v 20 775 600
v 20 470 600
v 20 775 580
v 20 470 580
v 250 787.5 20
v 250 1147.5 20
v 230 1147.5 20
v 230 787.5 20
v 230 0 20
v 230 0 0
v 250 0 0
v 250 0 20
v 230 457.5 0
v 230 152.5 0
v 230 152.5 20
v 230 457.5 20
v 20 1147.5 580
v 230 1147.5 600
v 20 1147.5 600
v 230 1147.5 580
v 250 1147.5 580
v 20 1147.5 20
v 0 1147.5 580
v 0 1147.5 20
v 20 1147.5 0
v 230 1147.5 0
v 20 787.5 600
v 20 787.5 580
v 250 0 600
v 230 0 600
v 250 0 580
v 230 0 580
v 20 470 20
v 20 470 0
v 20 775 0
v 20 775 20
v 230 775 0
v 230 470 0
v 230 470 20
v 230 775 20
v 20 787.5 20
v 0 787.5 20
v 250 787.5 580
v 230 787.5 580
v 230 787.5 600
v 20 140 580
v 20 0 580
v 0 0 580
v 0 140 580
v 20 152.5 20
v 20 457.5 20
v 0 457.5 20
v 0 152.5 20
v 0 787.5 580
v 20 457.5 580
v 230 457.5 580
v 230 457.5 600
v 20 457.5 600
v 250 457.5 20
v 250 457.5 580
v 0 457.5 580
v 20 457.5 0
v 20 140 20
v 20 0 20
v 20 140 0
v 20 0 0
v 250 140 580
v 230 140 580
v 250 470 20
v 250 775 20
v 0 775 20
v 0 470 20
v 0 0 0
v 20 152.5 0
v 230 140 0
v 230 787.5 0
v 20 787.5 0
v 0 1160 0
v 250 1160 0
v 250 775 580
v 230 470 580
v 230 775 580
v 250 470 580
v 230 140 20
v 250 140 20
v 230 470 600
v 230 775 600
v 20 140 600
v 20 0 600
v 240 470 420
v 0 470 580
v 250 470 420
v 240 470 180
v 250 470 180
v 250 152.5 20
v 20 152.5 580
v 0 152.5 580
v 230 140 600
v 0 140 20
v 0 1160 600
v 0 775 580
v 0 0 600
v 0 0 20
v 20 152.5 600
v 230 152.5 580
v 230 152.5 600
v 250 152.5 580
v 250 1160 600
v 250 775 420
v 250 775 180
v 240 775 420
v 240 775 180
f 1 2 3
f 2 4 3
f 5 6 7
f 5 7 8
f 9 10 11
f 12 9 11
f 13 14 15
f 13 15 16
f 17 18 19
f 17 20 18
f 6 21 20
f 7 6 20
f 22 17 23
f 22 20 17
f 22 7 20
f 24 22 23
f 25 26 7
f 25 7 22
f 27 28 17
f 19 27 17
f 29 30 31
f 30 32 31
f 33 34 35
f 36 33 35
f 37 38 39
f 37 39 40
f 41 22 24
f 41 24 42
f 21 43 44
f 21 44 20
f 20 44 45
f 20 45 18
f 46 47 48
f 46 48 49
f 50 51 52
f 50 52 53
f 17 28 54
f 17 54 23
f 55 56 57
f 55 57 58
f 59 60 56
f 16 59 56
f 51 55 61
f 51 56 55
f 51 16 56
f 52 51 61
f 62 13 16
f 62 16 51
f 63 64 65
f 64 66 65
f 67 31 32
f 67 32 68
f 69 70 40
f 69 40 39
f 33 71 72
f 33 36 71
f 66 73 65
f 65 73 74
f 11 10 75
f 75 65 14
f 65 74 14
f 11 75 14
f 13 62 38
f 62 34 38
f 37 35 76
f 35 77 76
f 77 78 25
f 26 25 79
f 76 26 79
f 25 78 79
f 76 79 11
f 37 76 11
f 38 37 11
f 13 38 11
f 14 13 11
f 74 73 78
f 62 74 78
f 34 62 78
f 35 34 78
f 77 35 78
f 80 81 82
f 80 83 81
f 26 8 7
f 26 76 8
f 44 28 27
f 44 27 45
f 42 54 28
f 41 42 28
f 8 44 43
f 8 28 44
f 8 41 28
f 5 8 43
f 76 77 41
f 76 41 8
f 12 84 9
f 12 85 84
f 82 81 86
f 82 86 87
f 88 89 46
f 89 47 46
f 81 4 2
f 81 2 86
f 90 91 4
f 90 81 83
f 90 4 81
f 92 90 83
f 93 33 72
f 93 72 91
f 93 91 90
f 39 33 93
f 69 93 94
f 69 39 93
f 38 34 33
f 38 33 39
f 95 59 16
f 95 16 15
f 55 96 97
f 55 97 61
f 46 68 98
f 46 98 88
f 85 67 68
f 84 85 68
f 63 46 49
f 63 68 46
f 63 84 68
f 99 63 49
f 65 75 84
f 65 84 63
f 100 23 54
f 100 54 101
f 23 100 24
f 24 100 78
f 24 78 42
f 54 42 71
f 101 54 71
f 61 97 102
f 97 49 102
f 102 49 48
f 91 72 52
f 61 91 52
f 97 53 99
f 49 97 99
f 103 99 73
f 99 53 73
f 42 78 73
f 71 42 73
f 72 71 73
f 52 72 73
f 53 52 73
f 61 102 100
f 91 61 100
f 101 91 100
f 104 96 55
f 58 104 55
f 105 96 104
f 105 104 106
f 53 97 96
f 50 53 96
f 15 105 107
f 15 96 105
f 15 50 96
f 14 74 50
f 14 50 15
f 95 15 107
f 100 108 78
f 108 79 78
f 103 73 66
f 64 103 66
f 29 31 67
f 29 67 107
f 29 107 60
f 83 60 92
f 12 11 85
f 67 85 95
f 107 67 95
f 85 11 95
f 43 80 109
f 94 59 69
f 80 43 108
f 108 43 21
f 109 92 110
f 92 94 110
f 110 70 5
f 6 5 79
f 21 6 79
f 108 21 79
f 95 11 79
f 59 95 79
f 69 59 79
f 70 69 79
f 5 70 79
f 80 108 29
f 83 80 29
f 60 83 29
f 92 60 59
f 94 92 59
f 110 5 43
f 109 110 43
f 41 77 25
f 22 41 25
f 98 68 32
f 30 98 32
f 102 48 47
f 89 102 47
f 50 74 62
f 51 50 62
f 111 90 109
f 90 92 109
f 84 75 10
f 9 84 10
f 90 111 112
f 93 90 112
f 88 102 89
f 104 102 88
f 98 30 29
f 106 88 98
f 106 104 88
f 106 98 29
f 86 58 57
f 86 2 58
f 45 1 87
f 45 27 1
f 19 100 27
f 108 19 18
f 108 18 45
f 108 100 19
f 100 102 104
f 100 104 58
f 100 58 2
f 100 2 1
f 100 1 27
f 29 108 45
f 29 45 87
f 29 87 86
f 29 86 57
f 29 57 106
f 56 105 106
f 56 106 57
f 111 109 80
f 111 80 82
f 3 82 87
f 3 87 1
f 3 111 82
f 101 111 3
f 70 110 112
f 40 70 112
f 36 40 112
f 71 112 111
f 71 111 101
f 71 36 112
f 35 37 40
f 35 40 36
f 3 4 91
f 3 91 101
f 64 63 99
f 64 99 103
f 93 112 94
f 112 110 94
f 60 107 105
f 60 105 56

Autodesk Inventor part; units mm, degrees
ref_plane "YZ Plane" through (0, 0, 0) normal (1, 0, 0) x (0, 1, 0)
ref_plane "XZ Plane" through (0, 0, 0) normal (0, 1, 0) x (-1, 0, 0)
ref_plane "XY Plane" through (0, 0, 0) normal (0, 0, 1) x (1, 0, 0)
sketch "Boceto1" plane through (0, 0, 0) normal (0, 0, 1) x (1, 0, 0)
  line L0 (250, 0) -> (250, 1160)
  line L1 (0, 1160) -> (0, 0)
  line L2 (230, 20) -> (230, 0)
  line L3 (20, 20) -> (20, 0)
  line L4 (230, 0) -> (230, 140)
  line L5 (230, 140) -> (20, 140)
  line L6 (20, 152.5) -> (230, 152.5)
  line L7 (230, 152.5) -> (230, 457.5)
  line L8 (230, 457.5) -> (20, 457.5)
  line L9 (20, 457.5) -> (20, 470)
  line L10 (20, 470) -> (230, 470)
  line L11 (230, 470) -> (230, 457.5)
  line L12 (230, 470) -> (230, 775)
  line L13 (230, 775) -> (20, 775)
  line L14 (20, 775) -> (20, 787.5)
  line L15 (20, 787.5) -> (230, 787.5)
  line L16 (230, 787.5) -> (230, 775)
  line L17 (230, 787.5) -> (230, 1147.5)
  line L18 (230, 1147.5) -> (20, 1147.5)
  line L19 (20, 1160) -> (230, 1160)
  line L20 (230, 1160) -> (230, 1147.5)
  line L21 (0, 0) -> (20, 0)
  line L22 (230, 0) -> (250, 0)
  line L23 (20, 20) -> (20, 140)
  line L24 (230, 140) -> (230, 20)
  line L25 (20, 152.5) -> (20, 457.5)
  line L26 (230, 1147.5) -> (230, 470)
  line L27 (230, 457.5) -> (230, 152.5)
  line L28 (20, 470) -> (20, 775)
  line L29 (20, 787.5) -> (20, 1147.5)
  line L30 (0, 0) -> (529.2462, 0) construction
  line L31 (20, 1160) -> (0, 1160)
  line L32 (230, 1160) -> (250, 1160)
  line L33 (230, 1147.5) -> (250, 1147.5)
  dimension "d5" = 140
  dimension "d6" = 12.5
  dimension "d7" = 305
  dimension "d8" = 12.5
  dimension "d9" = 305
  dimension "d10" = 12.5
  dimension "d11" = 360
  dimension "d13" = 12.5
  dimension "d28" = 1160
  dimension "d29" = 250
  dimension "d30" = 210
  dimension "d31" = 20
extrude "Extrusión1" add sketch "Boceto1" along normal blind 600 contours L22 L2 L4 L5 L23 L3 L21 L1 L31 L19 L20 L33 L0 | L33 L20 L32 L0 | L16 L13 L14 L15 | L11 L8 L9 L10
sketch "Boceto2" plane through (250, 0, 0) normal (1, 0, 0) x (0, 0, -1)
  line L0 (0, 457.5) -> (0, 152.5) projected
  line L1 (0, 152.5) -> (0, 457.5) projected
  line L2 (0, 0) -> (-600, 0) projected
  line L3 (0, 0) -> (-600, 0) projected
  line L4 (0, 0) -> (-600, 0) projected
  line L5 (0, 0) -> (-600, 0) projected
  line L6 (-600, 140) -> (-600, 0) projected
  line L7 (0, 140) -> (0, 0) projected
  line L8 (0, 0) -> (-600, 0) projected
  line L9 (-600, 140) -> (-600, 0) projected
  line L10 (0, 140) -> (-600, 140) projected
  line L11 (0, 0) -> (-600, 0) projected
  line L12 (0, 0) -> (-600, 0) projected
  line L13 (0, 140) -> (-600, 140) projected
  line L14 (0, 0) -> (0, 140) projected
  line L15 (0, 140) -> (-600, 140) projected
  line L16 (-600, 0) -> (-600, 140) projected
  line L17 (0, 0) -> (-600, 0) projected
  line L18 (0, 140) -> (-600, 140) projected
  line L19 (0, 140) -> (-600, 140) projected
  line L20 (0, 152.5) -> (-600, 152.5) projected
  line L21 (-600, 457.5) -> (-600, 152.5) projected
  line L22 (0, 457.5) -> (0, 152.5) projected
  line L23 (0, 152.5) -> (-600, 152.5) projected
  line L24 (-600, 457.5) -> (-600, 152.5) projected
  line L25 (0, 457.5) -> (-600, 457.5) projected
  line L26 (-600, 152.5) -> (-600, 457.5) projected
  line L27 (0, 152.5) -> (0, 457.5) projected
  line L28 (0, 457.5) -> (-600, 457.5) projected
  line L29 (-600, 152.5) -> (-600, 457.5) projected
  line L30 (0, 152.5) -> (-600, 152.5) projected
  line L31 (0, 0) -> (0, 1160) projected
  line L32 (0, 1160) -> (0, 0) projected
  line L33 (0, 140) -> (0, 0) projected
  line L34 (0, 0) -> (0, 140) projected
  line L35 (0, 1160) -> (0, 0) projected
  line L36 (0, 0) -> (0, 1160) projected
  line L37 (0, 470) -> (0, 775) projected
  line L38 (0, 775) -> (0, 470) projected
  line L39 (0, 152.5) -> (0, 457.5) projected
  line L40 (0, 457.5) -> (0, 152.5) projected
  line L41 (-600, 0) -> (-600, 1160) projected
  line L42 (0, 0) -> (0, 1160) projected
  line L43 (-600, 0) -> (-600, 1160) projected
  line L44 (0, 0) -> (-600, 0) projected
  line L45 (-600, 1160) -> (-600, 0) projected
  line L46 (0, 1160) -> (0, 0) projected
  line L47 (0, 0) -> (-600, 0) projected
  line L48 (-600, 1160) -> (-600, 0) projected
  line L49 (-600, 140) -> (-600, 0) projected
  line L50 (-600, 0) -> (-600, 1160) projected
  line L51 (-600, 1160) -> (-600, 0) projected
  line L52 (-600, 0) -> (-600, 140) projected
  line L53 (-600, 470) -> (-600, 775) projected
  line L54 (-600, 775) -> (-600, 470) projected
  line L55 (-600, 457.5) -> (-600, 152.5) projected
  line L56 (-600, 152.5) -> (-600, 457.5) projected
  line L57 (0, 1600) -> (-600, 1600) projected
  line L58 (0, 152.5) -> (-600, 152.5) projected
  line L59 (0, 152.5) -> (-600, 152.5) projected
  line L60 (0, 152.5) -> (-600, 152.5) projected
  line L61 (0, 0) -> (-600, 0) projected
  line L62 (0, 140) -> (-600, 140) projected
  line L63 (0, 140) -> (0, 0) projected
  line L64 (-600, 0) -> (-600, 140) projected
  line L65 (0, 0) -> (-600, 0) projected
  line L66 (0, 0) -> (0, 140) projected
  line L67 (0, 1160) -> (-600, 1160) projected
  line L68 (0, 1160) -> (-600, 1160) projected
  line L69 (0, 1160) -> (0, 1147.5) projected
  line L70 (0, 1580) -> (-600, 1580) projected
  line L71 (0, 1580) -> (-600, 1580) projected
  line L72 (0, 1580) -> (0, 1160) projected
  line L73 (-600, 1160) -> (-600, 1147.5) projected
  line L74 (-600, 470) -> (-600, 775) projected
  line L75 (0, 457.5) -> (-600, 457.5) projected
  line L76 (0, 457.5) -> (-600, 457.5) projected
  line L77 (0, 457.5) -> (-600, 457.5) projected
  line L78 (0, 457.5) -> (-600, 457.5) projected
  line L79 (0, 470) -> (-600, 470) projected
  line L80 (0, 470) -> (-600, 470) projected
  line L81 (0, 470) -> (-600, 470) projected
  line L82 (-600, 775) -> (-600, 470) projected
  line L83 (0, 775) -> (0, 470) projected
  line L84 (0, 775) -> (0, 470) projected
  line L85 (0, 470) -> (-600, 470) projected
  line L86 (-600, 775) -> (-600, 470) projected
  line L87 (0, 775) -> (-600, 775) projected
  line L88 (0, 470) -> (0, 775) projected
  line L89 (0, 470) -> (0, 775) projected
  line L90 (0, 775) -> (-600, 775) projected
  line L91 (-600, 470) -> (-600, 775) projected
  line L92 (0, 470) -> (-600, 470) projected
  line L93 (0, 470) -> (-600, 470) projected
  line L94 (0, 775) -> (-600, 775) projected
  line L95 (0, 775) -> (-600, 775) projected
  line L96 (0, 775) -> (-600, 775) projected
  line L97 (0, 775) -> (-600, 775) projected
  line L98 (0, 787.5) -> (-600, 787.5) projected
  line L99 (0, 787.5) -> (-600, 787.5) projected
  line L100 (0, 787.5) -> (-600, 787.5) projected
  line L101 (0, 787.5) -> (-600, 787.5) projected
  line L102 (-600, 1147.5) -> (-600, 787.5) projected
  line L103 (-600, 787.5) -> (-600, 1147.5) projected
  line L104 (0, 1147.5) -> (-600, 1147.5) projected
  line L105 (0, 1147.5) -> (0, 787.5) projected
  line L106 (0, 787.5) -> (-600, 787.5) projected
  line L107 (-600, 1147.5) -> (-600, 787.5) projected
  line L108 (0, 1147.5) -> (-600, 1147.5) projected
  line L109 (0, 787.5) -> (0, 1147.5) projected
  line L110 (0, 1147.5) -> (-600, 1147.5) projected
  line L111 (-600, 787.5) -> (-600, 1147.5) projected
  line L112 (0, 787.5) -> (-600, 787.5) projected
  line L113 (0, 1147.5) -> (0, 787.5) projected
  line L114 (0, 787.5) -> (0, 1147.5) projected
  line L115 (0, 1600) -> (-600, 1600) projected
  line L116 (0, 1147.5) -> (-600, 1147.5) projected
  line L117 (0, 1147.5) -> (-600, 1147.5) projected
  line L118 (0, 1147.5) -> (-600, 1147.5) projected
  line L119 (0, 1160) -> (-600, 1160) projected
  line L120 (0, 1160) -> (-600, 1160) projected
  line L121 (0, 787.5) -> (0, 1147.5) projected
  line L122 (-600, 787.5) -> (-600, 1147.5) projected
  line L123 (0, 1580) -> (0, 1160) projected
  line L124 (0, 1160) -> (-600, 1160) projected
  line L125 (-600, 1580) -> (-600, 1160) projected
  line L126 (0, 1580) -> (-600, 1580) projected
  line L127 (0, 1600) -> (-600, 1600) projected
  line L128 (0, 1600) -> (-600, 1600) projected
  line L129 (0, 1580) -> (-600, 1580) projected
  line L130 (0, 1580) -> (-600, 1580) projected
  line L131 (-580, 0) -> (-580, 1600)
  line L132 (-20, 1600) -> (-20, 0)
  line L133 (0, 1160) -> (-600, 1160) projected
  line L134 (0, 1160) -> (-600, 1160) projected
  line L135 (0, 1147.5) -> (-600, 1147.5) projected
  line L136 (0, 787.5) -> (-600, 787.5) projected
  point P0 (-20, 1160)
  point P1 (-20, 1580)
  point P2 (-580, 1580)
  point P3 (-580, 1160)
  point P4 (-20, 787.5)
  point P5 (-20, 1147.5)
  point P6 (-580, 1147.5)
  point P7 (-580, 787.5)
  point P8 (-20, 470)
  point P9 (-20, 775)
  point P10 (-580, 775)
  point P11 (-580, 470)
  point P12 (-20, 152.5)
  point P13 (-20, 457.5)
  point P14 (-580, 457.5)
  point P15 (-580, 152.5)
  point P16 (-20, 140)
  point P17 (-580, 140)
  dimension "d16" = 20
  dimension "d17" = 20
extrude "Extrusión2" cut sketch "Boceto2" against normal blind 600 contours L132 L20 L131 L25 | L79 L131 L87 L132 | L132 L2 L131 L10 | L98 L131 L104 L132
sketch "Boceto3" plane through (250, 0, 0) normal (1, 0, 0) x (0, 0, -1)
  line L0 (-20, 787.5) -> (-580, 787.5) projected
  line L1 (-20, 1147.5) -> (-580, 1147.5) projected
  line L2 (-420, 787.5) -> (-180, 787.5)
  line L3 (-180, 1147.5) -> (-420, 1147.5)
  line L4 (-580, 787.5) -> (-580, 1147.5) projected
  line L5 (-20, 1147.5) -> (-20, 787.5) projected
  line L6 (-580, 775) -> (-20, 775) projected
  line L7 (-580, 470) -> (-20, 470) projected
  line L8 (-420, 775) -> (-180, 775)
  line L9 (-180, 775) -> (-180, 470)
  line L10 (-180, 470) -> (-420, 470)
  line L11 (-420, 470) -> (-420, 775)
  line L12 (-300, 775) -> (-300, 470)
  line L13 (-20, 775) -> (-20, 470) projected
  point P0 (0, 0)
  dimension "d32" = 240
  dimension "d33" = 160
extrude "Extrusión3" add sketch "Boceto3" against normal blind 10 contours L6 L12 L7 L11 | L6 L9 L7 L12
properties part number "ESTANTERÍA2" material "Aluminio 6061"
